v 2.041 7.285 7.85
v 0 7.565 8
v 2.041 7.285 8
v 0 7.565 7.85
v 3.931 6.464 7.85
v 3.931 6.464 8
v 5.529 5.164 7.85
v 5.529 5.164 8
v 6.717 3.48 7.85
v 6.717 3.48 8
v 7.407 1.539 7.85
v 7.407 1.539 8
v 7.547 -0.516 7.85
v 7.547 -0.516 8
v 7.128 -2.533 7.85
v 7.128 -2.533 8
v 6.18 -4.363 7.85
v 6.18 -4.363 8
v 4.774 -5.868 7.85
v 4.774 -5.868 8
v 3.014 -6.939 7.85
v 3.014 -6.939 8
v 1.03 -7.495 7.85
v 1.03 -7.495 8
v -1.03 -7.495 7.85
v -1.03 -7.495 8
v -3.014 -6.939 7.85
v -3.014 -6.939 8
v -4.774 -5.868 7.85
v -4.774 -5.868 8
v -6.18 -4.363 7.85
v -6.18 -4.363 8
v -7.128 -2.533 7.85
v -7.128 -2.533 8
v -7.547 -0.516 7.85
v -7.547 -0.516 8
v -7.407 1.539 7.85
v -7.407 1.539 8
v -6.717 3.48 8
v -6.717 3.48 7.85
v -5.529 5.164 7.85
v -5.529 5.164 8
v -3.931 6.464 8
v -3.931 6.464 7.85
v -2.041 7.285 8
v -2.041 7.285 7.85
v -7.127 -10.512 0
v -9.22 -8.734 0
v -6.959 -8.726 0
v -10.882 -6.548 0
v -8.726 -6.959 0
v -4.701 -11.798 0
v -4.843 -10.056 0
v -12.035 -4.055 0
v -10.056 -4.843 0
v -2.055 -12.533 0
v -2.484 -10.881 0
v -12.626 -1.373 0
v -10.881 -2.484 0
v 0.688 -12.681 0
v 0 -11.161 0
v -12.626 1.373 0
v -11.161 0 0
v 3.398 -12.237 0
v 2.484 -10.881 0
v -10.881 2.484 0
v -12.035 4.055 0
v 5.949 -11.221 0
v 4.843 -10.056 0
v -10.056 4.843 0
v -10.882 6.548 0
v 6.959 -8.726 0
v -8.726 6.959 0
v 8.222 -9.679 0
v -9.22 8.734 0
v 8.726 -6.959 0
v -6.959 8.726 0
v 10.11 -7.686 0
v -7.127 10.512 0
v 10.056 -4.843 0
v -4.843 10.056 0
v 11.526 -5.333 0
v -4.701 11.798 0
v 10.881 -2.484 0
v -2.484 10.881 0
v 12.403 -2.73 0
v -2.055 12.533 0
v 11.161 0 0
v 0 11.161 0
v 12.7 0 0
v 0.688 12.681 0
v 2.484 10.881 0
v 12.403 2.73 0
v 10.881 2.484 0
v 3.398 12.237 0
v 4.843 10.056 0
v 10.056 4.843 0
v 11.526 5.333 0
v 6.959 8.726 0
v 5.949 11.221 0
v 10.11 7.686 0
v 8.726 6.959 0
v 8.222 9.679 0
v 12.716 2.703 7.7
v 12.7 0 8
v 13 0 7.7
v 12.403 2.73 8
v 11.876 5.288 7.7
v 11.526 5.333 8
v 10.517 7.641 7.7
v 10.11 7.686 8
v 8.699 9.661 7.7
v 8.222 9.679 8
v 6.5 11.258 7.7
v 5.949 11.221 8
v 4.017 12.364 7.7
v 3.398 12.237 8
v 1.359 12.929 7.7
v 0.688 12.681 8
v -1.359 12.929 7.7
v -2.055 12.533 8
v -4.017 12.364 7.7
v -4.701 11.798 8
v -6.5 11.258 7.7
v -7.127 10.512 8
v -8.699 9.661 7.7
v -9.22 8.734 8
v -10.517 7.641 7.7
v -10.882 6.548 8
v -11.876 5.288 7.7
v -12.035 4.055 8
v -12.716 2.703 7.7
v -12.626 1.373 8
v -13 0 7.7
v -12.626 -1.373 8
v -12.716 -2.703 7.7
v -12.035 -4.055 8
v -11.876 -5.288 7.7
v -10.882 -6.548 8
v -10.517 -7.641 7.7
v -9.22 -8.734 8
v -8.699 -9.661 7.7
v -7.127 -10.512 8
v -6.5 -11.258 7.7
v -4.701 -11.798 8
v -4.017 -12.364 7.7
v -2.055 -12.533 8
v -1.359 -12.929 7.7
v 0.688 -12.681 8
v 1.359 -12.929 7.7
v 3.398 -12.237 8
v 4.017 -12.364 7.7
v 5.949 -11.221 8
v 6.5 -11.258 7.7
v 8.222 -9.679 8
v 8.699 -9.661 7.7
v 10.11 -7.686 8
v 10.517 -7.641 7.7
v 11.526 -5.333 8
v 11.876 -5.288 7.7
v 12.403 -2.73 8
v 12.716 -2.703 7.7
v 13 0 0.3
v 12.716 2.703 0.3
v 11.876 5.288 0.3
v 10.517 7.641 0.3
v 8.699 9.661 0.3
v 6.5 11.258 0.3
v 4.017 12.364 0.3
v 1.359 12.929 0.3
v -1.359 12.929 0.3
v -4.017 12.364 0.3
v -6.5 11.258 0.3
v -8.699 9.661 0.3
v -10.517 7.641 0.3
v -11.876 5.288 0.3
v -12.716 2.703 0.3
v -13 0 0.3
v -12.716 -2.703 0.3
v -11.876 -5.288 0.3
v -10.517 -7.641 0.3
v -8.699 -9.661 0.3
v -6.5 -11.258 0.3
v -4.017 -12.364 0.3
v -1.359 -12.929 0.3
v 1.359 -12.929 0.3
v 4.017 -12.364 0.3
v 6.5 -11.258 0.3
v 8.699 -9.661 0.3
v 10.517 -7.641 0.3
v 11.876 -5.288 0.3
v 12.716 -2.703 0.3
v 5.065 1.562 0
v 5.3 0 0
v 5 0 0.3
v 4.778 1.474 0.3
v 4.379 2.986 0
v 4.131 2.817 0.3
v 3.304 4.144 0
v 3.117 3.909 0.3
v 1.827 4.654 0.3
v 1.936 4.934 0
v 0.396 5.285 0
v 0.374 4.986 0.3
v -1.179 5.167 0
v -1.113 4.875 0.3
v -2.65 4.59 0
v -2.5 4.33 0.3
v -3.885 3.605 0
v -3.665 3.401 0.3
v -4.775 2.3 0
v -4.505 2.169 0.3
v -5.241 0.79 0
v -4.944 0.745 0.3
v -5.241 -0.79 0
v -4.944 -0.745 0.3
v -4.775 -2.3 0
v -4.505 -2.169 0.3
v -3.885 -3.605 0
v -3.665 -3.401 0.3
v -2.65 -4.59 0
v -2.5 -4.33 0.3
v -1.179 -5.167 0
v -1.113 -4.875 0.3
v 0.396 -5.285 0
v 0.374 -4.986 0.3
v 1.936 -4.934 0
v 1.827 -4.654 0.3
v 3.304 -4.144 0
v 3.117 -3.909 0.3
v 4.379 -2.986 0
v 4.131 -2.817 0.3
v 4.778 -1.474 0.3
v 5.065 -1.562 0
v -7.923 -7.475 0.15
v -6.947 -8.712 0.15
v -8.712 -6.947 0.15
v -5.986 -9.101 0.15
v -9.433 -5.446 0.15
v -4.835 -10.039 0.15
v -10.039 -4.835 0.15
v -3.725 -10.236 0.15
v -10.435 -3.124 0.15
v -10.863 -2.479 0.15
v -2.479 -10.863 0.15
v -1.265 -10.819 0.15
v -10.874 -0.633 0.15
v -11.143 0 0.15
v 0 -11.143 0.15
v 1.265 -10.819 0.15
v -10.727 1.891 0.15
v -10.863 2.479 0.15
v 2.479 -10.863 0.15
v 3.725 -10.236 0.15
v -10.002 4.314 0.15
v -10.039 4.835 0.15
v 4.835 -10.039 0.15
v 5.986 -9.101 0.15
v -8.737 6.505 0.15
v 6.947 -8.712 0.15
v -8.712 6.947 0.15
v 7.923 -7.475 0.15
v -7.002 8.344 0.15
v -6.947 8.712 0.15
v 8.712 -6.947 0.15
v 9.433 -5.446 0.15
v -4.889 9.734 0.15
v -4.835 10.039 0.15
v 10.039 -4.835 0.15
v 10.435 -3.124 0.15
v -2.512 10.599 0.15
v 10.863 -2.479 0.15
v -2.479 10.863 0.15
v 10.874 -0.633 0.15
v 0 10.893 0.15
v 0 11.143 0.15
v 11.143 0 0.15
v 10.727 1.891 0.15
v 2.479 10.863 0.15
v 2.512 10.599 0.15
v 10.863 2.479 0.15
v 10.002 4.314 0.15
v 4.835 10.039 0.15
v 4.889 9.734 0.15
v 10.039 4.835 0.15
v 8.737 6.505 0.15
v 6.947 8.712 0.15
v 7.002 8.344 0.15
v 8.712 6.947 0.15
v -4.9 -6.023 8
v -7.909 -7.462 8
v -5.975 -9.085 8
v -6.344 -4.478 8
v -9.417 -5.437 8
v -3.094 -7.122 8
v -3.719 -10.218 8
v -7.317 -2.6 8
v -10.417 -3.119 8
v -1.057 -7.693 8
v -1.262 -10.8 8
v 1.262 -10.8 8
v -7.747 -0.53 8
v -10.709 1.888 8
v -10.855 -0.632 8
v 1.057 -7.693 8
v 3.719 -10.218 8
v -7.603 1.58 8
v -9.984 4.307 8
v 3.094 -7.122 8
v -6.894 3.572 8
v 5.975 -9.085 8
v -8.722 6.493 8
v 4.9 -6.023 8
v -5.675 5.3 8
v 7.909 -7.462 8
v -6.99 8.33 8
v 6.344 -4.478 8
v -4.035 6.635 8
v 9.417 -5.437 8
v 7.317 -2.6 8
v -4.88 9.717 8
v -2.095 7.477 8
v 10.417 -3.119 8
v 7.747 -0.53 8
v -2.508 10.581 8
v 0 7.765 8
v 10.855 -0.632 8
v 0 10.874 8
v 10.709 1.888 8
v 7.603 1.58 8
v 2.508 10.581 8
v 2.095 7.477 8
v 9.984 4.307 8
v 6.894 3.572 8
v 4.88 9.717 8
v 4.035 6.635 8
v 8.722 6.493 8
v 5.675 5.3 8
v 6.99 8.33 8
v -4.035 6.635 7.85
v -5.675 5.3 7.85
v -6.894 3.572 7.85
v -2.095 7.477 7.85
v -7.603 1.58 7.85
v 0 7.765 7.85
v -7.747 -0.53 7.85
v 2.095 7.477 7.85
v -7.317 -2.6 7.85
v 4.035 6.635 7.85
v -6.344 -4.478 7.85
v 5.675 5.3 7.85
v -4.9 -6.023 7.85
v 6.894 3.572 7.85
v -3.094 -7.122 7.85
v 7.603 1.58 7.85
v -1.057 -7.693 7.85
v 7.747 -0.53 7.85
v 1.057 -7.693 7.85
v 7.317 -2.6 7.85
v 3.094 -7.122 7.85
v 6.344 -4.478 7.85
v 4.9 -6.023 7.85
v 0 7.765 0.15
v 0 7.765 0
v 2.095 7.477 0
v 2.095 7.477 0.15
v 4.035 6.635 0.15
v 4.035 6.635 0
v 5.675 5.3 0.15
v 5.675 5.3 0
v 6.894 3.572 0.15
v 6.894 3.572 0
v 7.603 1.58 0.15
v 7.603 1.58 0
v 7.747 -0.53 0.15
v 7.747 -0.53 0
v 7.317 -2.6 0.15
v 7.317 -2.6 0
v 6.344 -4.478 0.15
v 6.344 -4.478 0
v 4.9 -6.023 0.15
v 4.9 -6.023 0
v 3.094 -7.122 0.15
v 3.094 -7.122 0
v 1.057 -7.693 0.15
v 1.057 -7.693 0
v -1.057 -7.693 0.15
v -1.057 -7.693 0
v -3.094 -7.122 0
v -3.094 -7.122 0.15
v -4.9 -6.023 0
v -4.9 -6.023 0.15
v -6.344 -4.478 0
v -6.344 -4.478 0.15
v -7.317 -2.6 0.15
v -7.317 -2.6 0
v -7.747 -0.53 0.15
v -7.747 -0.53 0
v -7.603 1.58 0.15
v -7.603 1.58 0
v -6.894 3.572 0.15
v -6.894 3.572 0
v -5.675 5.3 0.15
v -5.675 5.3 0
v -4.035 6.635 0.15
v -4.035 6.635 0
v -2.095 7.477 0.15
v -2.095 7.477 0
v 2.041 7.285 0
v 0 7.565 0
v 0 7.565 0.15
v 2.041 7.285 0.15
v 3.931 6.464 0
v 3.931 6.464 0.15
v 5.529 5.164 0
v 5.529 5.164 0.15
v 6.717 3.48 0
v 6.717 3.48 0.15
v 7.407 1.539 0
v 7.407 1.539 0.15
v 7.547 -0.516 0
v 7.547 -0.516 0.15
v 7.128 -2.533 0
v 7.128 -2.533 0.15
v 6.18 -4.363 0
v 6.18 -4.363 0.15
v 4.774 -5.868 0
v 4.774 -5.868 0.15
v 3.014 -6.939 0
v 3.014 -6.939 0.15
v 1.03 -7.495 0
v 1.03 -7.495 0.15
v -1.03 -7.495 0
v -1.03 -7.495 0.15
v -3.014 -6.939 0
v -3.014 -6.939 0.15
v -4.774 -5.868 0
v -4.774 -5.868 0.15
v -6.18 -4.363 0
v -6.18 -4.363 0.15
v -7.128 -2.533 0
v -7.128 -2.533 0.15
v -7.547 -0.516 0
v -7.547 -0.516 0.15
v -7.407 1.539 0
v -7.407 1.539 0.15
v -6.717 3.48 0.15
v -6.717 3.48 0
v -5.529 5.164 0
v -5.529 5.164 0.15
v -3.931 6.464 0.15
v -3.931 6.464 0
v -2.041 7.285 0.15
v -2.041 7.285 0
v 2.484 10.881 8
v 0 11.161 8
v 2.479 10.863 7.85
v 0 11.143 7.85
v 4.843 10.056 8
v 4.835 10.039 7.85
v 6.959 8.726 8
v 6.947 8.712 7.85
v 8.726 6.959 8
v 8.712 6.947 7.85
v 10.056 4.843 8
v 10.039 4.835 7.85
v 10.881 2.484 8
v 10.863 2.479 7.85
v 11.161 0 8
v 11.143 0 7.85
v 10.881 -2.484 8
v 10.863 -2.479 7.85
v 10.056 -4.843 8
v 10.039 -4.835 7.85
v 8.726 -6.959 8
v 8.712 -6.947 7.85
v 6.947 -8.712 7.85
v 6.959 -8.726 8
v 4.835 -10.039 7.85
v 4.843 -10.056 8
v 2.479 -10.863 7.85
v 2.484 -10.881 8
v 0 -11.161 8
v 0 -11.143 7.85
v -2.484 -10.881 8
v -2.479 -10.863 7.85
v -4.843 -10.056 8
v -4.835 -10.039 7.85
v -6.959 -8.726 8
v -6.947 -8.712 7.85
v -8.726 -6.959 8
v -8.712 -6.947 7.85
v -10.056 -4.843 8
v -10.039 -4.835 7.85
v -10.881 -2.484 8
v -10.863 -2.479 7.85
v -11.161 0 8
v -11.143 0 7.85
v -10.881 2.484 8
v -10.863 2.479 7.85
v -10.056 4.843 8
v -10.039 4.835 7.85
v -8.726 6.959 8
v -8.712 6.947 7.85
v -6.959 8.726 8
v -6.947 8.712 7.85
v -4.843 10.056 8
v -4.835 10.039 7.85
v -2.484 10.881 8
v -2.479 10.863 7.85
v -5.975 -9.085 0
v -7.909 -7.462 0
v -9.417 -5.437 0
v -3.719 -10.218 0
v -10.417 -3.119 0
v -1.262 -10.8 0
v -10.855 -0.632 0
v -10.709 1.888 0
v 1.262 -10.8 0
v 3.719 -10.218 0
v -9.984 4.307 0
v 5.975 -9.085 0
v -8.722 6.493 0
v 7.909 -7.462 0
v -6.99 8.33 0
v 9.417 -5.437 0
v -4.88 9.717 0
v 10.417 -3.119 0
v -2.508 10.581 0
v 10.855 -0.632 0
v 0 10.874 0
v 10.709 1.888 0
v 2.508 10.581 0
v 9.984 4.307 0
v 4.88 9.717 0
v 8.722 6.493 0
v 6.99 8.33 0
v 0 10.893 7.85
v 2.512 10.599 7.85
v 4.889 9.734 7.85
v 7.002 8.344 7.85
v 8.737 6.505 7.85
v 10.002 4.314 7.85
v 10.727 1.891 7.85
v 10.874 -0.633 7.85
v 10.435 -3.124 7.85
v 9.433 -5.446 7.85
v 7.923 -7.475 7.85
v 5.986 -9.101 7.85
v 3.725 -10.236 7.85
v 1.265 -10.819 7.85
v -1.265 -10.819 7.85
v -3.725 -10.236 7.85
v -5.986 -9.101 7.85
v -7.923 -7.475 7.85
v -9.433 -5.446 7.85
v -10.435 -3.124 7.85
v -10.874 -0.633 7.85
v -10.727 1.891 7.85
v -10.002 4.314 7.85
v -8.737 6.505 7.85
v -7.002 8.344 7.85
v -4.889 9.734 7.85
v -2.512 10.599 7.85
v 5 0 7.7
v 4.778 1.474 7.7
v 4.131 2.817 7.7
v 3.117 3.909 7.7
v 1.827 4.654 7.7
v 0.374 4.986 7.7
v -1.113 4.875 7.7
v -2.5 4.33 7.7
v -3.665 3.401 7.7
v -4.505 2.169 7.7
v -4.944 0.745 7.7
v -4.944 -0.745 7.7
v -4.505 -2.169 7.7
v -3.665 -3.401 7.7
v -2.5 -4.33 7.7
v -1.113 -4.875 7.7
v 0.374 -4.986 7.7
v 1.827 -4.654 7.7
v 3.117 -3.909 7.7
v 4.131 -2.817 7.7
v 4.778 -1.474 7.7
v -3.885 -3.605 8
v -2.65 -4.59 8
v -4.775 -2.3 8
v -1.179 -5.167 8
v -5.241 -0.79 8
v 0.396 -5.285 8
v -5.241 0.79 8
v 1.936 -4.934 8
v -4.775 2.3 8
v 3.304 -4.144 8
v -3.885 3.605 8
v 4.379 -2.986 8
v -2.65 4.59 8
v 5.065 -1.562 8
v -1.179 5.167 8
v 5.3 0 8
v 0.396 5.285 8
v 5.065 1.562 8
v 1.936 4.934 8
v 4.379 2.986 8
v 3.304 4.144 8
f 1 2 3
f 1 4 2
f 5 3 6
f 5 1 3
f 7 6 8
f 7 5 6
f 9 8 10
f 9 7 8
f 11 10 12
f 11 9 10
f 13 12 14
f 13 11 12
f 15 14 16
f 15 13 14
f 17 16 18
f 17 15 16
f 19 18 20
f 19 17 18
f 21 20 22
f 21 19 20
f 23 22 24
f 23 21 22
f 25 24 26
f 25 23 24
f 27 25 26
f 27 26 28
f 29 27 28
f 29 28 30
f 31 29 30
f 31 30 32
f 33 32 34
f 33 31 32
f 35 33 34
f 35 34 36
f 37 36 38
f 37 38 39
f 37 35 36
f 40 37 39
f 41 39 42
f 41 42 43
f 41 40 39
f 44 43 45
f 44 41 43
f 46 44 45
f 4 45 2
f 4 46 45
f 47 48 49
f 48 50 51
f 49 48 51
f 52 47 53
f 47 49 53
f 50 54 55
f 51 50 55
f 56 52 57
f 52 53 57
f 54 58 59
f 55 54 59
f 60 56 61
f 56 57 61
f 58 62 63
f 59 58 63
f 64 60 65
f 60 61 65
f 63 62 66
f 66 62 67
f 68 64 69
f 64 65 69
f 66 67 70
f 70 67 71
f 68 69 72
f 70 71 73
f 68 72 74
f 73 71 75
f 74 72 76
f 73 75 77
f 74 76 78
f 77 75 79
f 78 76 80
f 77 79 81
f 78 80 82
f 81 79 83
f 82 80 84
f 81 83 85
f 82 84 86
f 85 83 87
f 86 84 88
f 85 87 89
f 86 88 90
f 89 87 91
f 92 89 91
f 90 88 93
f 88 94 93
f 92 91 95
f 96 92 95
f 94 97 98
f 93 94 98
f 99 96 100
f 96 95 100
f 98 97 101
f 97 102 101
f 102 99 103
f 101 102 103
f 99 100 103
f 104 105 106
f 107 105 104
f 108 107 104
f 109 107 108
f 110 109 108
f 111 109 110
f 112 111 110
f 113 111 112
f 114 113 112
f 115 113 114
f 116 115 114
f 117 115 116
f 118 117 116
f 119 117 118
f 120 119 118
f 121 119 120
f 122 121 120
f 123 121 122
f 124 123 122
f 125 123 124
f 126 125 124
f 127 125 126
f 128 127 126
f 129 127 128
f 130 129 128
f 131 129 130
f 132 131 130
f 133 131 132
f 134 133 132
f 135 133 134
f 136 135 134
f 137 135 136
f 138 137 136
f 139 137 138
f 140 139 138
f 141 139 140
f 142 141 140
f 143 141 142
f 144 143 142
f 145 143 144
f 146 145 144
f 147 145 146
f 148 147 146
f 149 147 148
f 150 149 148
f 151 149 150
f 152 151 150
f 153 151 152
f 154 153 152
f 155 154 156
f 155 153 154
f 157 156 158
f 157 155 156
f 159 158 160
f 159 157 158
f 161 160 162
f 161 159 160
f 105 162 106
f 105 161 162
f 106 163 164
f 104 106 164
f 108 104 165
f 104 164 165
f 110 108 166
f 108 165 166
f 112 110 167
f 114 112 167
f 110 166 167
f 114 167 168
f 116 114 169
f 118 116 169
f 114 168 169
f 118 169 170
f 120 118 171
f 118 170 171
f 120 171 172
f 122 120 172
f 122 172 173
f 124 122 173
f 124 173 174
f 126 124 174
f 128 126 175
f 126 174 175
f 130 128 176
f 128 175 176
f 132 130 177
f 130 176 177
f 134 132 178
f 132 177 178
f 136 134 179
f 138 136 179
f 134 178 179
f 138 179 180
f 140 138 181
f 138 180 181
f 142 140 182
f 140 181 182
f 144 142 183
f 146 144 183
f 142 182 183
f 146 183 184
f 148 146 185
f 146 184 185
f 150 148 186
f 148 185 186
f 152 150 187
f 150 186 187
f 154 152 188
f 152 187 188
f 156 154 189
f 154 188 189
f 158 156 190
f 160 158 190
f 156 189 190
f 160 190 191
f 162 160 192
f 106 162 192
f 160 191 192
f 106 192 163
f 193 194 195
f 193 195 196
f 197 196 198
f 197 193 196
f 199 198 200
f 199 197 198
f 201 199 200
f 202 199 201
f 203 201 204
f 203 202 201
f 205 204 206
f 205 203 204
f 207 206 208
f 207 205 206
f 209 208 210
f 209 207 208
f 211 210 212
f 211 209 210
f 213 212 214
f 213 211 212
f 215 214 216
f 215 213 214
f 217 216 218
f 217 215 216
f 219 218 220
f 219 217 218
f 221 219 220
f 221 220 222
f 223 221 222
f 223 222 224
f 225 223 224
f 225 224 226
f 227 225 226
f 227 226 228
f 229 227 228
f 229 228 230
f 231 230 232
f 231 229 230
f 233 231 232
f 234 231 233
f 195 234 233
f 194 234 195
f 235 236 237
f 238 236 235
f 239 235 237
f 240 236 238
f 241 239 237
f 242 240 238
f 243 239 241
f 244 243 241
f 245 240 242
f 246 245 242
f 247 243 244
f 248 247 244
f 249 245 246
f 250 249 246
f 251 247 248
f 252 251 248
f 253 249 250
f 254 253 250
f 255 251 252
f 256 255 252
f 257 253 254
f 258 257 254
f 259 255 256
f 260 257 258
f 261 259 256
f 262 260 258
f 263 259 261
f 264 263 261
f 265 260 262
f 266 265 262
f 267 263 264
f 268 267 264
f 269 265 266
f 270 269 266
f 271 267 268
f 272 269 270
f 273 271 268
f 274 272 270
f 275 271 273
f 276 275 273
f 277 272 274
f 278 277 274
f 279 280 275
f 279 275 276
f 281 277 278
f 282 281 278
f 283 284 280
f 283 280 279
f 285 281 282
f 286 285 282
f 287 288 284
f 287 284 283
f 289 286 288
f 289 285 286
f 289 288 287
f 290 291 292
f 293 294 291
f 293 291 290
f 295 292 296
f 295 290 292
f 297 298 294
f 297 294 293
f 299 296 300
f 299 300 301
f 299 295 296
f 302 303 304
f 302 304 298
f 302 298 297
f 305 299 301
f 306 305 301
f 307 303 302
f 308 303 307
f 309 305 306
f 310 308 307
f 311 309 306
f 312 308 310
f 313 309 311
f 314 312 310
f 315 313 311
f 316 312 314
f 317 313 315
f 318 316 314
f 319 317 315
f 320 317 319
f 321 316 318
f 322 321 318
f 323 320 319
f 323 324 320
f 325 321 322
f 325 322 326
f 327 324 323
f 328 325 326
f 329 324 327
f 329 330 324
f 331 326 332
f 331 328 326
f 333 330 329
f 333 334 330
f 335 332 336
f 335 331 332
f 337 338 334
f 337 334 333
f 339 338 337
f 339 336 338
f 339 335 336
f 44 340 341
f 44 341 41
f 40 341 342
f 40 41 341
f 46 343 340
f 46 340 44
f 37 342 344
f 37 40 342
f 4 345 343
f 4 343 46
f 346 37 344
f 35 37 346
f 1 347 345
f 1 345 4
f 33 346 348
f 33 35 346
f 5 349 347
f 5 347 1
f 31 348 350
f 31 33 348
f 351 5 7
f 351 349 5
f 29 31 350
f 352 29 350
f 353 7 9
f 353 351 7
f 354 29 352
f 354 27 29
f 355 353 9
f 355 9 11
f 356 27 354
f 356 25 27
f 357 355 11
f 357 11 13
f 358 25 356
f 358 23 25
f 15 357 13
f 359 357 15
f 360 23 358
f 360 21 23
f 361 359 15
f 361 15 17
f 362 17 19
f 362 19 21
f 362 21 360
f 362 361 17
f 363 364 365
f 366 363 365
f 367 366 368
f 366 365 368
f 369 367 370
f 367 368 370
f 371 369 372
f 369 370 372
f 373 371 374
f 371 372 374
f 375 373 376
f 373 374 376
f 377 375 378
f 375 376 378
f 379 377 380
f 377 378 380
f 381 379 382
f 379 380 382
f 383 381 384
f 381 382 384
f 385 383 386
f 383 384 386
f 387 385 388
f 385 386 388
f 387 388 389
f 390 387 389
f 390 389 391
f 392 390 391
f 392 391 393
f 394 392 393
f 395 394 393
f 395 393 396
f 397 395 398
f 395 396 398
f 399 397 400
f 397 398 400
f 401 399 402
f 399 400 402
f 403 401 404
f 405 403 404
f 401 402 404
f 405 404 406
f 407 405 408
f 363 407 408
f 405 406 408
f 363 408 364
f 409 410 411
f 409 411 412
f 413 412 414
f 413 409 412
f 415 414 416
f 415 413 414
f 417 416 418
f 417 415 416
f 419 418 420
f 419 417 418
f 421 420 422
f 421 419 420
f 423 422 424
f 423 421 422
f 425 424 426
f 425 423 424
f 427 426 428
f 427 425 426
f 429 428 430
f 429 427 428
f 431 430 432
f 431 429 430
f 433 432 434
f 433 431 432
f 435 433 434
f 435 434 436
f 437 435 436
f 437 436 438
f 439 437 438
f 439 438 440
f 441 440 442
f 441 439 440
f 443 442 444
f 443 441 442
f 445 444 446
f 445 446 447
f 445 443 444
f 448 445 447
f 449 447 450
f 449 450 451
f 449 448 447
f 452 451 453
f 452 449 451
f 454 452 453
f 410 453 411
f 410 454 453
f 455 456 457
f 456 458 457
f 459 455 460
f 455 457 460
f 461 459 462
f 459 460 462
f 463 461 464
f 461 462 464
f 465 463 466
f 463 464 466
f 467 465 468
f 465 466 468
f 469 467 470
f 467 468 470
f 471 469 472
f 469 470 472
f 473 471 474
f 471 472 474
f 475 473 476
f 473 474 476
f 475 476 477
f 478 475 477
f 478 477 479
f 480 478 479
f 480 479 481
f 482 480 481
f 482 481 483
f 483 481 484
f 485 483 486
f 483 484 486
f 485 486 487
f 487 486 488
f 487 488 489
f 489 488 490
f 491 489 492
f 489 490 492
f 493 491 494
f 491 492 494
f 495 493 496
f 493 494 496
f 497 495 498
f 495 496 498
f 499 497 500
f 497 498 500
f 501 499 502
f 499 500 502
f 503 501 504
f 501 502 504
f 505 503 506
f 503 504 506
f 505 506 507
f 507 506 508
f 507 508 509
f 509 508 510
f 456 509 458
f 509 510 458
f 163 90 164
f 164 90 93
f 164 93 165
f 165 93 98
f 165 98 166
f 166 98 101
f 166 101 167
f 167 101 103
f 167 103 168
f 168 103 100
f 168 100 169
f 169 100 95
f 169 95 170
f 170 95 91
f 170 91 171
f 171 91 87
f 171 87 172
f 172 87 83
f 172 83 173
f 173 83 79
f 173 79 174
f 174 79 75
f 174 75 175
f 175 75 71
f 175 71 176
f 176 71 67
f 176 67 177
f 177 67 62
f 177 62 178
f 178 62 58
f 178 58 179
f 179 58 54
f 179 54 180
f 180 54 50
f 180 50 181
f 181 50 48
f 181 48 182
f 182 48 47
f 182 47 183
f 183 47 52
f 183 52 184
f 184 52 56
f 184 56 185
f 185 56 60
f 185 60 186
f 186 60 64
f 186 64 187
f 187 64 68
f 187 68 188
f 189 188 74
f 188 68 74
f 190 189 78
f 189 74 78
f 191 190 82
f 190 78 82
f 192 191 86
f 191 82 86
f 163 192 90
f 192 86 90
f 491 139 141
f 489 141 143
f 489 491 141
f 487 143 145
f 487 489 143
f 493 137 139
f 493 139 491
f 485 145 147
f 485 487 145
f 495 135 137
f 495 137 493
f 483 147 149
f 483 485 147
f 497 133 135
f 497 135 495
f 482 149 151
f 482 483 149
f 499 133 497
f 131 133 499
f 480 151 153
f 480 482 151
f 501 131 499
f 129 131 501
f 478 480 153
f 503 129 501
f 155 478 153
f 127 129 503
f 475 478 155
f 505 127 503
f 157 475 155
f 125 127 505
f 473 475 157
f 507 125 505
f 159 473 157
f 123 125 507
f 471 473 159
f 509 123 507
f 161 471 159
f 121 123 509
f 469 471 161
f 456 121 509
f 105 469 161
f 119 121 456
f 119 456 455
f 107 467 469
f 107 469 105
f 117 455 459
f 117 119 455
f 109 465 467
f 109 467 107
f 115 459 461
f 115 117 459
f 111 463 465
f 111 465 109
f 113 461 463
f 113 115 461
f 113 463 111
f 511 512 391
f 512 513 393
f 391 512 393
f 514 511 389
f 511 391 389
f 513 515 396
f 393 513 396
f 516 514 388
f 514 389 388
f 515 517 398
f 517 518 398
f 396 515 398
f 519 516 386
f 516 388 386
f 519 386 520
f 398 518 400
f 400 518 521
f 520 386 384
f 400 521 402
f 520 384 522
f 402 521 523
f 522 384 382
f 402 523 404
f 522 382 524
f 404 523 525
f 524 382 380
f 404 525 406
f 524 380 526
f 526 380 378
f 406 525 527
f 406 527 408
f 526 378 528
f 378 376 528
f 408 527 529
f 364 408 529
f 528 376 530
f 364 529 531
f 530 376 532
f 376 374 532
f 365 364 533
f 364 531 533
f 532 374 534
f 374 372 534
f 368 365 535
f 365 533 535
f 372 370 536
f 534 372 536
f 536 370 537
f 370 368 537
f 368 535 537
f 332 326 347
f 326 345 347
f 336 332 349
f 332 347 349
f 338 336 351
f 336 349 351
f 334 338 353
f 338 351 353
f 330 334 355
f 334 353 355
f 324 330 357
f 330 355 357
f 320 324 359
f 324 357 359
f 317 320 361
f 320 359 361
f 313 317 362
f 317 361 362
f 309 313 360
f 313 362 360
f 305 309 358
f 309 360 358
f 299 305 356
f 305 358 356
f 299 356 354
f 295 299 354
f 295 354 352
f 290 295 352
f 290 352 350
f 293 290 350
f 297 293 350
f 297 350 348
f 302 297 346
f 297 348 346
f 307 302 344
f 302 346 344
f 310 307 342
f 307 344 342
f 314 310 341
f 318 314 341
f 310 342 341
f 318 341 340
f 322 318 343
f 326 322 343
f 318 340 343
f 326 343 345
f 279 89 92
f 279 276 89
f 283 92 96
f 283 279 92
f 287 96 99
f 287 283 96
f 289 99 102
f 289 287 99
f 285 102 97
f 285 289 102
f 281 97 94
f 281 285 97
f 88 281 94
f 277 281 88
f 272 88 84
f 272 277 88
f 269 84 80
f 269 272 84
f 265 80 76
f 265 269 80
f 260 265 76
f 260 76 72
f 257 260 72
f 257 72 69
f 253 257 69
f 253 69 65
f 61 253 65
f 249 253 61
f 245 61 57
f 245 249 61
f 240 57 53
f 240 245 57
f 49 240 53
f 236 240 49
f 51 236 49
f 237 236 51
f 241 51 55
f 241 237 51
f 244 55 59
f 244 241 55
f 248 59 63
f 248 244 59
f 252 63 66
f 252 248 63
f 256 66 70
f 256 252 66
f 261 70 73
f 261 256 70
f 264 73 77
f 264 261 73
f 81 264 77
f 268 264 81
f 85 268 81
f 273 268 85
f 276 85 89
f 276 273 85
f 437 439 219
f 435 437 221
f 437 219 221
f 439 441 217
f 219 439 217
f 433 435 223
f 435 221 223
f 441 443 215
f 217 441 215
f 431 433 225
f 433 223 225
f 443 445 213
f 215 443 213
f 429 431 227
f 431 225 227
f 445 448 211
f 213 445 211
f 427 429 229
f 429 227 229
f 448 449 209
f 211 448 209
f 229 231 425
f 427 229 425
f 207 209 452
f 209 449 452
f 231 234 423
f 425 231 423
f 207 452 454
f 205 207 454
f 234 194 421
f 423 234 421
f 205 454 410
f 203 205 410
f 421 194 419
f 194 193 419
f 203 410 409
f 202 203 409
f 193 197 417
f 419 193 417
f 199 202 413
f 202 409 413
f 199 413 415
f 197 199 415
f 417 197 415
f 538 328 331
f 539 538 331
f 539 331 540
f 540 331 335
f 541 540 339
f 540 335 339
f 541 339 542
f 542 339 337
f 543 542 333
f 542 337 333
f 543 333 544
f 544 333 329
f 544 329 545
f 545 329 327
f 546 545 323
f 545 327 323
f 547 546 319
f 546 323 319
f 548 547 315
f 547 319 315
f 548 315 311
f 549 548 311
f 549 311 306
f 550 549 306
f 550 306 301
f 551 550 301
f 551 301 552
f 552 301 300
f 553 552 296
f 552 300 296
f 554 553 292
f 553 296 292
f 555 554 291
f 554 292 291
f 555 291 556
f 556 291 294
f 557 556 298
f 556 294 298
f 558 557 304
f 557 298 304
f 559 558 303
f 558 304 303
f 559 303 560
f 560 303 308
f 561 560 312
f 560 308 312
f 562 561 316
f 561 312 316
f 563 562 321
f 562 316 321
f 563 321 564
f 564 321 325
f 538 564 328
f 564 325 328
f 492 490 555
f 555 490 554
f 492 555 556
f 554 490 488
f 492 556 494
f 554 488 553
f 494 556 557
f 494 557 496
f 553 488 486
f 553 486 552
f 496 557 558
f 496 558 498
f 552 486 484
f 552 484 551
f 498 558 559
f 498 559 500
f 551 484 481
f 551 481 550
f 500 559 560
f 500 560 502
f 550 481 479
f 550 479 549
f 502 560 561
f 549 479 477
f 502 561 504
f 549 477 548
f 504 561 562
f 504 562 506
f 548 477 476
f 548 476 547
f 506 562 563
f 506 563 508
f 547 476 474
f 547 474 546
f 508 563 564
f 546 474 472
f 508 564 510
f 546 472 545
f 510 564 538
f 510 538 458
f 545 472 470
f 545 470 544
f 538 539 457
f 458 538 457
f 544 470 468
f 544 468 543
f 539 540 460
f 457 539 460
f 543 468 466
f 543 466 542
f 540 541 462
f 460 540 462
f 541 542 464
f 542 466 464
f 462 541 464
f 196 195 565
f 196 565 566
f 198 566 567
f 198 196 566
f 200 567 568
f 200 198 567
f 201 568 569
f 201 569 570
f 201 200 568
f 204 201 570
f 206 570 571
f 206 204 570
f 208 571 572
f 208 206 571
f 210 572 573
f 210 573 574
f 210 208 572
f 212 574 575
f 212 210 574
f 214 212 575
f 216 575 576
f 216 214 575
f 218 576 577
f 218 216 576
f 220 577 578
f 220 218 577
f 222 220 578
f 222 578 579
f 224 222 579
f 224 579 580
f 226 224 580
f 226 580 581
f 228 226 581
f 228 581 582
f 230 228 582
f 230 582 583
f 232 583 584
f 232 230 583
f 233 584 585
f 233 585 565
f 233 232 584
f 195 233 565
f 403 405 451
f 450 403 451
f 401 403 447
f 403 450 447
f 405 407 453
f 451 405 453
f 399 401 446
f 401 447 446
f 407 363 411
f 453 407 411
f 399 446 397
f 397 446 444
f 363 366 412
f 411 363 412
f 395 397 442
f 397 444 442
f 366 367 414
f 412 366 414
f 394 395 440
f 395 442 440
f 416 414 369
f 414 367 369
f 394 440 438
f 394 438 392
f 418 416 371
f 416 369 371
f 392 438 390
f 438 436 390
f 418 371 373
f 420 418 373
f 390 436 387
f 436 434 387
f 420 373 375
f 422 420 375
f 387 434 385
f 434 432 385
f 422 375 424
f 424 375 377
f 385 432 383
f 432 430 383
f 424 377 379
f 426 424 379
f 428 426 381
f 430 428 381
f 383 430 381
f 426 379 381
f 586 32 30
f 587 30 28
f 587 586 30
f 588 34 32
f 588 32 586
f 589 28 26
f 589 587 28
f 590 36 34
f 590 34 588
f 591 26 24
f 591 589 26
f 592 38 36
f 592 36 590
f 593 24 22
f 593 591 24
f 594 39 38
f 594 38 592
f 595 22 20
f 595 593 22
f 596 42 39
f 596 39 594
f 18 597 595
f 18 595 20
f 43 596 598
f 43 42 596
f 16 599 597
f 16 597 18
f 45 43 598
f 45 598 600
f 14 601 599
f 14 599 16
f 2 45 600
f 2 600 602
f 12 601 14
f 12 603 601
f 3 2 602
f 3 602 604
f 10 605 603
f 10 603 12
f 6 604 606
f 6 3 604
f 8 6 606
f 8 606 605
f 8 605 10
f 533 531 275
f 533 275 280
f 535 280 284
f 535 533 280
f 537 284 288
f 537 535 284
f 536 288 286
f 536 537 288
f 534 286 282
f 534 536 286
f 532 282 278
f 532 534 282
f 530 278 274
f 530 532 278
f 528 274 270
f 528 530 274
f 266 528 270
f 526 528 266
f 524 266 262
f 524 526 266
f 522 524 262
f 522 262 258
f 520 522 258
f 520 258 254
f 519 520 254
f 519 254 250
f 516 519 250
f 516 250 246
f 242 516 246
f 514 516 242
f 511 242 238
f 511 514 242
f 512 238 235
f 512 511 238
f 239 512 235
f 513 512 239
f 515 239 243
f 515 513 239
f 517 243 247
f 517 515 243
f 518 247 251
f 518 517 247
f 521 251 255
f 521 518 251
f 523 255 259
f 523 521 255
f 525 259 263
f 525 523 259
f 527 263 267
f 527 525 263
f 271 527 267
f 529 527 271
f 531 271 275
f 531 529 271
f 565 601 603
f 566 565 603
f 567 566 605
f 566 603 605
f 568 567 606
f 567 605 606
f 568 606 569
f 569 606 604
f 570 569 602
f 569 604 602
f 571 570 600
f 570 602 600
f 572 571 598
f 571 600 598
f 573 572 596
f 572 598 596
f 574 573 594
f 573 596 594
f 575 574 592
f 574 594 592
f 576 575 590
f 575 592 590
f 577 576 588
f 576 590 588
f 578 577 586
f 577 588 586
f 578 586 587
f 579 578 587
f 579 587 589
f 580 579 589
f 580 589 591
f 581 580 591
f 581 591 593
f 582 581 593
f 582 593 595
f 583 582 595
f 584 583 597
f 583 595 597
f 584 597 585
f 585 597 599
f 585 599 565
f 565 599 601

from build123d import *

# Parameters (mm, degrees)
CROQUIS1_R              = 13
CROQUIS1_R_2            = 5
SALIENTE_EXTRUIR1_DEPTH = 8
CHAFL_N1_SIZE           = 0.3
CROQUIS2_W              = 1
CROQUIS2_H              = 0.2


with BuildPart() as part:
    # Croquis1 → Saliente-Extruir1 (new body)
    with BuildSketch(Plane.XY):
        Circle(CROQUIS1_R)
        Circle(CROQUIS1_R_2, mode=Mode.SUBTRACT)
    extrude(amount=SALIENTE_EXTRUIR1_DEPTH)

    # Chaflán1
    chafl_n1_edges = [part.edges().sort_by_distance(p)[0] for p in [
        (-13, 0, 0),
        (-13, 0, 8),
        (-5, 0, 0),
        (-5, 0, 8),
    ]]
    chamfer(chafl_n1_edges, length=CHAFL_N1_SIZE)

    # Croquis2 → Cortar-Revolución1 (revolve, cut)
    with BuildSketch(Plane(origin=(0, 0, 0), x_dir=(0, 0, -1), z_dir=(1, 0, 0))):
        Polygon((-8.85, 11.267505128), (-7.85, 11.142505128), (-7.85, 10.892505128), (-8.85, 10.767505128), align=None)
        Polygon((0.85, 10.767505128), (0.85, 11.267505128), (-0.15, 11.142505128), (-0.15, 10.892505128), align=None)
        with Locations((-8.35, 7.665073065)):
            Rectangle(CROQUIS2_W, CROQUIS2_H)
        with Locations((0.35, 7.665073065)):
            Rectangle(CROQUIS2_W, CROQUIS2_H)
    revolve(axis=Axis((0, 0, 12.411349243), (0, 0, -1)), mode=Mode.SUBTRACT)


solid = part.part
